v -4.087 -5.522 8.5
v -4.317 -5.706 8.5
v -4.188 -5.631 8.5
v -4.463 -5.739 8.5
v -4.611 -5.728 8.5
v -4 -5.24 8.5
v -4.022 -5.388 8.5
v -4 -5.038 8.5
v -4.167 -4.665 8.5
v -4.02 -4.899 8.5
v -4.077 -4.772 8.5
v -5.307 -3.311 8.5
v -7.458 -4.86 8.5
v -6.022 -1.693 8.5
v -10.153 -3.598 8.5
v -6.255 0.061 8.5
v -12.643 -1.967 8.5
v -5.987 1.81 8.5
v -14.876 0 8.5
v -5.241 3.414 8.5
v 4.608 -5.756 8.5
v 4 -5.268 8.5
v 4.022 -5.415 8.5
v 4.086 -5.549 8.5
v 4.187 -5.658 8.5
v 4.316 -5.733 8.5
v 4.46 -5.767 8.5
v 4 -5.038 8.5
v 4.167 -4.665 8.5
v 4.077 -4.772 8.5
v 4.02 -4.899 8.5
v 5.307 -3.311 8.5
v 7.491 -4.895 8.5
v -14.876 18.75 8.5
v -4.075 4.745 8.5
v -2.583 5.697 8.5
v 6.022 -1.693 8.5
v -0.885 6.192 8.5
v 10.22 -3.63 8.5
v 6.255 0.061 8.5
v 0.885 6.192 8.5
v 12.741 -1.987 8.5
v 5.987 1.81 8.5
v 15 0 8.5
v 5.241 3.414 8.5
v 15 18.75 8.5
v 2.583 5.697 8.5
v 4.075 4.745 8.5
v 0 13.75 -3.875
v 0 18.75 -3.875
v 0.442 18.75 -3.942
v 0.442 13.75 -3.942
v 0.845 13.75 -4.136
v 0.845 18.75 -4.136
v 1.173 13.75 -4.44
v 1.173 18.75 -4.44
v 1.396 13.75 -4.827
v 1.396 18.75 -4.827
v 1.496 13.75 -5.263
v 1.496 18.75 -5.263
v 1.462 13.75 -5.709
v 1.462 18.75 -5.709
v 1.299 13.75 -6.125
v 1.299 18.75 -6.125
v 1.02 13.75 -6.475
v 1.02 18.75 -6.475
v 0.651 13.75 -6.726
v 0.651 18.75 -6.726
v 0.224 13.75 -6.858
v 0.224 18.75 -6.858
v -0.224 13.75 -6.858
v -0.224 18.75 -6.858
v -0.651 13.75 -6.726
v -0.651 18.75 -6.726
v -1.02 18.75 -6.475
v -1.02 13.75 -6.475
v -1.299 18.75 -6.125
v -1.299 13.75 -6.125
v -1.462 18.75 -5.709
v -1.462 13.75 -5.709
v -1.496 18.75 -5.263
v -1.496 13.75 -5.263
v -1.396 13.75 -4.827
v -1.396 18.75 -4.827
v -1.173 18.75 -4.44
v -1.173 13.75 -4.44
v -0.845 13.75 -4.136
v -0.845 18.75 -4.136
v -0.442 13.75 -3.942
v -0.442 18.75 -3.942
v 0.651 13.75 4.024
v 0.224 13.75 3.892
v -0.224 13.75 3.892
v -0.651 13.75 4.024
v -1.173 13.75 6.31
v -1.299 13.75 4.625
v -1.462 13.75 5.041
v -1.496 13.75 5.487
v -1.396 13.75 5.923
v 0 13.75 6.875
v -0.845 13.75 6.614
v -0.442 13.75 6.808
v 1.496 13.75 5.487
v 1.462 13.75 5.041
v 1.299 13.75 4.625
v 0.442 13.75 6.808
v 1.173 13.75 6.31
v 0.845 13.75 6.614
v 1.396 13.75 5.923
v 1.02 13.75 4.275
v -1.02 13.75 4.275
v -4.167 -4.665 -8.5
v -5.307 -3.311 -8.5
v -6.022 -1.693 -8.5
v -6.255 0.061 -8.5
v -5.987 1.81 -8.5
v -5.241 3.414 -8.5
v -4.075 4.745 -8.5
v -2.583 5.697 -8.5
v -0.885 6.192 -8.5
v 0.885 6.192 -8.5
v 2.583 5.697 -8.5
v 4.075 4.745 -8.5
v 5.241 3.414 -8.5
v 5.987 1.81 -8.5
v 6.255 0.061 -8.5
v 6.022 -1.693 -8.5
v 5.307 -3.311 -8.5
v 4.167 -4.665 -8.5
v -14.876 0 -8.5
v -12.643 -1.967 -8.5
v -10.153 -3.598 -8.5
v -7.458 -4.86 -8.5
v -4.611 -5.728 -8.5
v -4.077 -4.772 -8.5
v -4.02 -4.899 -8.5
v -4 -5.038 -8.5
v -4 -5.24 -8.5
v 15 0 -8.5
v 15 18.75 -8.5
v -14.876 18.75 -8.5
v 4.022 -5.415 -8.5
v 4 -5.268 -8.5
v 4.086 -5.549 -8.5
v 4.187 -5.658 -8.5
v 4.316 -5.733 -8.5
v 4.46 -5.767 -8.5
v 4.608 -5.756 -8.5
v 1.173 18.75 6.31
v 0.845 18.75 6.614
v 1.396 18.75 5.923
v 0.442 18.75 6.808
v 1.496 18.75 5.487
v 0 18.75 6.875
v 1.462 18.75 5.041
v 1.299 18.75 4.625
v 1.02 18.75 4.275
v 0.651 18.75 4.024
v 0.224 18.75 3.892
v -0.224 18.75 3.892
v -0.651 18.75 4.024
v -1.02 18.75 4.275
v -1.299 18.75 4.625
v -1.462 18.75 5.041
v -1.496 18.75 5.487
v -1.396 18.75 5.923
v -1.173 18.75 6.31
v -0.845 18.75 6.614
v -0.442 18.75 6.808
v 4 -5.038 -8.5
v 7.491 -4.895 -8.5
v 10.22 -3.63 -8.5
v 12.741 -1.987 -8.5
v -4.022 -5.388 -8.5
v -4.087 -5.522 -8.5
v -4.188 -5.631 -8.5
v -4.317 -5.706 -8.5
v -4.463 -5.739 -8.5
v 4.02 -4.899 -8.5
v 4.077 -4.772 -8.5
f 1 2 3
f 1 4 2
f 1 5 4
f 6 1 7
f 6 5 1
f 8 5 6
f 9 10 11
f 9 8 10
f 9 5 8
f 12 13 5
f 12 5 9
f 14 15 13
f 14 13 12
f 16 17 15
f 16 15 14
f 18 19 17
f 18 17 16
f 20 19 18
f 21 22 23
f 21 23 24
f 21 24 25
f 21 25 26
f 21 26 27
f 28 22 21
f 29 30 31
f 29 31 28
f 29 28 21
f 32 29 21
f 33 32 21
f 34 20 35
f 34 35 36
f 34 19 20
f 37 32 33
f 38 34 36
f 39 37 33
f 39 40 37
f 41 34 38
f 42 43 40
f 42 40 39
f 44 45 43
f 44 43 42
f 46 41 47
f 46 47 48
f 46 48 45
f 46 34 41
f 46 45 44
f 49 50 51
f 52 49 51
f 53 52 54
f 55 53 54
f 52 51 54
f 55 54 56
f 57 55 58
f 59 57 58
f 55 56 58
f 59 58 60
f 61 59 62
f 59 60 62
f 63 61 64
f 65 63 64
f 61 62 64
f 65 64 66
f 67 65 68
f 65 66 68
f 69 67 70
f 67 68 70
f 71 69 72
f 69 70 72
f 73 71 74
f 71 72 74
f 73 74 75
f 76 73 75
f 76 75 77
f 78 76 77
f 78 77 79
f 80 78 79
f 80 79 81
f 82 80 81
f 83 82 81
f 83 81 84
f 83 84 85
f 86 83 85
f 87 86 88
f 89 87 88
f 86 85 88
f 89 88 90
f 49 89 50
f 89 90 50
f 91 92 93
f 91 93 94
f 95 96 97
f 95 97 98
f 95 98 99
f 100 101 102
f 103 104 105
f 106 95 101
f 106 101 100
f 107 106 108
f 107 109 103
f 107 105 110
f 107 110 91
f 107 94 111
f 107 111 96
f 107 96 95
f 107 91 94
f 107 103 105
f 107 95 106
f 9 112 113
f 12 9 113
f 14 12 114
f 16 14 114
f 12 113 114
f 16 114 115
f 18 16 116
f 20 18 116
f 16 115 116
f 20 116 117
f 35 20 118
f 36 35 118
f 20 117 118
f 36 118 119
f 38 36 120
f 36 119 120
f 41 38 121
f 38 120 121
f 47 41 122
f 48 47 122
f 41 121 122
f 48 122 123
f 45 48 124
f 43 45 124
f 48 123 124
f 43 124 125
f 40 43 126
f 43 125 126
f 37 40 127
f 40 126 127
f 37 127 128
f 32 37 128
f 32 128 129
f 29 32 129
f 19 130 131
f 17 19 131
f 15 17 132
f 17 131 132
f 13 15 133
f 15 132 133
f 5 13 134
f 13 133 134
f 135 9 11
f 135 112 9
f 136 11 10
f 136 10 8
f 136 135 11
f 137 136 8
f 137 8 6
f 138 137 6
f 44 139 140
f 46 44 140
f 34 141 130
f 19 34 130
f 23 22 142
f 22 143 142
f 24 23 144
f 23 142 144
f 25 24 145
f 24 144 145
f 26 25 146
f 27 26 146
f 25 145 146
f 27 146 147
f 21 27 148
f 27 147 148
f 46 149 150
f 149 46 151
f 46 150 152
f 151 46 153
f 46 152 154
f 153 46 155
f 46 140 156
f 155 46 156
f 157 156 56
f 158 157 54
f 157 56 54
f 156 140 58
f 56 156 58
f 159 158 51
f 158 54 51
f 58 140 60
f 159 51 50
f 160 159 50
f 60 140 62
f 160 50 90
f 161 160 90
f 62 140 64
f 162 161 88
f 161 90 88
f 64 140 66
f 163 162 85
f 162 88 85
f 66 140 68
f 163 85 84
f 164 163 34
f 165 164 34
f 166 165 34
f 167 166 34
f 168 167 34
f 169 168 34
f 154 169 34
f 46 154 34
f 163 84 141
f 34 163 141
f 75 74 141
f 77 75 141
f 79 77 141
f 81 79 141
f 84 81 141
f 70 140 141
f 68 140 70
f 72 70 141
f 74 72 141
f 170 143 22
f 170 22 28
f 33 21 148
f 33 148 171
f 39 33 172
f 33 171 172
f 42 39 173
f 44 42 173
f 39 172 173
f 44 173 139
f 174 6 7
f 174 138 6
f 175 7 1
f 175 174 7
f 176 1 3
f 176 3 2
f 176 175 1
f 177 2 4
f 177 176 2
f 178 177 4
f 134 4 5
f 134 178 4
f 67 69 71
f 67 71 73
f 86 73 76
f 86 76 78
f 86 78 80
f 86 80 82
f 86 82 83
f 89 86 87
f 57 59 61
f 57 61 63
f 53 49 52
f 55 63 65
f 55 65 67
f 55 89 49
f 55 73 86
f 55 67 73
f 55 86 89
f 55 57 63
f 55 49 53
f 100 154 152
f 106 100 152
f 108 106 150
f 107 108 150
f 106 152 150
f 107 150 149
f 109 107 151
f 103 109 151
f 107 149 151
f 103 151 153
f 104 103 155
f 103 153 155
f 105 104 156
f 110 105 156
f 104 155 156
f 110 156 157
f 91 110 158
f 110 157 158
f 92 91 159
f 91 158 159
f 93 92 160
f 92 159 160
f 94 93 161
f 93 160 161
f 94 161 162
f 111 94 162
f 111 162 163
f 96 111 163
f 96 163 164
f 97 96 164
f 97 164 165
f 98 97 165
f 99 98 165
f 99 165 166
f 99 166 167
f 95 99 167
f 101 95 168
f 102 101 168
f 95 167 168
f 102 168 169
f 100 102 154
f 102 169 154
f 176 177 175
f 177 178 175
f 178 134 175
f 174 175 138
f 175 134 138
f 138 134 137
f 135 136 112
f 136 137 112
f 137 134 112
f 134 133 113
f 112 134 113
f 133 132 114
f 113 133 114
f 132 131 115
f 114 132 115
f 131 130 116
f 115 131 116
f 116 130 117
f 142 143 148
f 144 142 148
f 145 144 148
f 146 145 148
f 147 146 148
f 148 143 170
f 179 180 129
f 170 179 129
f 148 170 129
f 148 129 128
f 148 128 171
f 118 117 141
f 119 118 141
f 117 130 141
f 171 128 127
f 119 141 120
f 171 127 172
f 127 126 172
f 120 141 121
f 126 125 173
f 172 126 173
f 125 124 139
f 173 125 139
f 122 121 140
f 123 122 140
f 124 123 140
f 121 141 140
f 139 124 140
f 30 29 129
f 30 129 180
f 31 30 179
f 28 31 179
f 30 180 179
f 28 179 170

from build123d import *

# Parameters (mm, degrees)
BOSS_EXTRUDE1_START = -8.5
BOSS_EXTRUDE1_DEPTH = 17
CUT_EXTRUDE2_DEPTH  = 30.420443572
FILLET1_R           = 0.5
FILLET2_R           = 0.5
FILLET3_R           = 0.5
FILLET4_R           = 0.5
SKETCH3_R           = 1.5
CUT_EXTRUDE3_DEPTH  = 5


# Read off the part's stored shape, not the designer's step: Boss-Extrude1
with BuildPart() as part:
    # Boss-Extrude1 outline → Boss-Extrude1 (new body)
    with BuildSketch(Plane.XY.offset(BOSS_EXTRUDE1_START)):
        with BuildLine():
            ThreePointArc((-0.026346322, -6.254944514), (0.013173118, 6.254986128), (0, -6.255))
            ThreePointArc((0, -6.255), (8.130777353, -4.640165574), (15, 0))
            Line((15, 0), (15, 18.75))
            Line((15, 18.75), (-14.876085662, 18.75))
            Line((-14.876085662, 18.75), (-14.876085662, 0))
            ThreePointArc((-14.876085662, 0), (-8.076154016, -4.611125189), (-0.026346322, -6.254944514))
        make_face()
    extrude(amount=BOSS_EXTRUDE1_DEPTH)

    # Sketch2 → Cut-Extrude2 (cut, through all)
    with BuildSketch(Plane.XY.offset(8.5)):
        Polygon((4, 0), (0, 0), (-4, 0), (-4, -9.216790773), (4, -9.216790773), align=None)
    extrude(amount=-CUT_EXTRUDE2_DEPTH, mode=Mode.SUBTRACT)

    # Fillet1
    fillet1_edges = [part.edges().sort_by_distance(p)[0] for p in [
        (4, -4.808848585, 0),
    ]]
    fillet(fillet1_edges, radius=FILLET1_R)

    # Fillet2
    fillet2_edges = [part.edges().sort_by_distance(p)[0] for p in [
        (4, -5.881926017, 0),
    ]]
    fillet(fillet2_edges, radius=FILLET2_R)

    # Fillet3
    fillet3_edges = [part.edges().sort_by_distance(p)[0] for p in [
        (-4, -4.808848645, 0),
    ]]
    fillet(fillet3_edges, radius=FILLET3_R)

    # Fillet4
    fillet4_edges = [part.edges().sort_by_distance(p)[0] for p in [
        (-4, -5.857856611, 0),
    ]]
    fillet(fillet4_edges, radius=FILLET4_R)

    # Sketch3 → Cut-Extrude3 (cut)
    with BuildSketch(Plane(origin=(0, 18.75, 0), x_dir=(1, 0, 0), z_dir=(0, 1, 0))):
        with Locations(Location((0, -5.375, 0), (0, 0, 270))):
            Circle(SKETCH3_R)
        with Locations(Location((0, 5.375, 0), (0, 0, 270))):
            Circle(SKETCH3_R)
    extrude(amount=-CUT_EXTRUDE3_DEPTH, mode=Mode.SUBTRACT)


solid = part.part
